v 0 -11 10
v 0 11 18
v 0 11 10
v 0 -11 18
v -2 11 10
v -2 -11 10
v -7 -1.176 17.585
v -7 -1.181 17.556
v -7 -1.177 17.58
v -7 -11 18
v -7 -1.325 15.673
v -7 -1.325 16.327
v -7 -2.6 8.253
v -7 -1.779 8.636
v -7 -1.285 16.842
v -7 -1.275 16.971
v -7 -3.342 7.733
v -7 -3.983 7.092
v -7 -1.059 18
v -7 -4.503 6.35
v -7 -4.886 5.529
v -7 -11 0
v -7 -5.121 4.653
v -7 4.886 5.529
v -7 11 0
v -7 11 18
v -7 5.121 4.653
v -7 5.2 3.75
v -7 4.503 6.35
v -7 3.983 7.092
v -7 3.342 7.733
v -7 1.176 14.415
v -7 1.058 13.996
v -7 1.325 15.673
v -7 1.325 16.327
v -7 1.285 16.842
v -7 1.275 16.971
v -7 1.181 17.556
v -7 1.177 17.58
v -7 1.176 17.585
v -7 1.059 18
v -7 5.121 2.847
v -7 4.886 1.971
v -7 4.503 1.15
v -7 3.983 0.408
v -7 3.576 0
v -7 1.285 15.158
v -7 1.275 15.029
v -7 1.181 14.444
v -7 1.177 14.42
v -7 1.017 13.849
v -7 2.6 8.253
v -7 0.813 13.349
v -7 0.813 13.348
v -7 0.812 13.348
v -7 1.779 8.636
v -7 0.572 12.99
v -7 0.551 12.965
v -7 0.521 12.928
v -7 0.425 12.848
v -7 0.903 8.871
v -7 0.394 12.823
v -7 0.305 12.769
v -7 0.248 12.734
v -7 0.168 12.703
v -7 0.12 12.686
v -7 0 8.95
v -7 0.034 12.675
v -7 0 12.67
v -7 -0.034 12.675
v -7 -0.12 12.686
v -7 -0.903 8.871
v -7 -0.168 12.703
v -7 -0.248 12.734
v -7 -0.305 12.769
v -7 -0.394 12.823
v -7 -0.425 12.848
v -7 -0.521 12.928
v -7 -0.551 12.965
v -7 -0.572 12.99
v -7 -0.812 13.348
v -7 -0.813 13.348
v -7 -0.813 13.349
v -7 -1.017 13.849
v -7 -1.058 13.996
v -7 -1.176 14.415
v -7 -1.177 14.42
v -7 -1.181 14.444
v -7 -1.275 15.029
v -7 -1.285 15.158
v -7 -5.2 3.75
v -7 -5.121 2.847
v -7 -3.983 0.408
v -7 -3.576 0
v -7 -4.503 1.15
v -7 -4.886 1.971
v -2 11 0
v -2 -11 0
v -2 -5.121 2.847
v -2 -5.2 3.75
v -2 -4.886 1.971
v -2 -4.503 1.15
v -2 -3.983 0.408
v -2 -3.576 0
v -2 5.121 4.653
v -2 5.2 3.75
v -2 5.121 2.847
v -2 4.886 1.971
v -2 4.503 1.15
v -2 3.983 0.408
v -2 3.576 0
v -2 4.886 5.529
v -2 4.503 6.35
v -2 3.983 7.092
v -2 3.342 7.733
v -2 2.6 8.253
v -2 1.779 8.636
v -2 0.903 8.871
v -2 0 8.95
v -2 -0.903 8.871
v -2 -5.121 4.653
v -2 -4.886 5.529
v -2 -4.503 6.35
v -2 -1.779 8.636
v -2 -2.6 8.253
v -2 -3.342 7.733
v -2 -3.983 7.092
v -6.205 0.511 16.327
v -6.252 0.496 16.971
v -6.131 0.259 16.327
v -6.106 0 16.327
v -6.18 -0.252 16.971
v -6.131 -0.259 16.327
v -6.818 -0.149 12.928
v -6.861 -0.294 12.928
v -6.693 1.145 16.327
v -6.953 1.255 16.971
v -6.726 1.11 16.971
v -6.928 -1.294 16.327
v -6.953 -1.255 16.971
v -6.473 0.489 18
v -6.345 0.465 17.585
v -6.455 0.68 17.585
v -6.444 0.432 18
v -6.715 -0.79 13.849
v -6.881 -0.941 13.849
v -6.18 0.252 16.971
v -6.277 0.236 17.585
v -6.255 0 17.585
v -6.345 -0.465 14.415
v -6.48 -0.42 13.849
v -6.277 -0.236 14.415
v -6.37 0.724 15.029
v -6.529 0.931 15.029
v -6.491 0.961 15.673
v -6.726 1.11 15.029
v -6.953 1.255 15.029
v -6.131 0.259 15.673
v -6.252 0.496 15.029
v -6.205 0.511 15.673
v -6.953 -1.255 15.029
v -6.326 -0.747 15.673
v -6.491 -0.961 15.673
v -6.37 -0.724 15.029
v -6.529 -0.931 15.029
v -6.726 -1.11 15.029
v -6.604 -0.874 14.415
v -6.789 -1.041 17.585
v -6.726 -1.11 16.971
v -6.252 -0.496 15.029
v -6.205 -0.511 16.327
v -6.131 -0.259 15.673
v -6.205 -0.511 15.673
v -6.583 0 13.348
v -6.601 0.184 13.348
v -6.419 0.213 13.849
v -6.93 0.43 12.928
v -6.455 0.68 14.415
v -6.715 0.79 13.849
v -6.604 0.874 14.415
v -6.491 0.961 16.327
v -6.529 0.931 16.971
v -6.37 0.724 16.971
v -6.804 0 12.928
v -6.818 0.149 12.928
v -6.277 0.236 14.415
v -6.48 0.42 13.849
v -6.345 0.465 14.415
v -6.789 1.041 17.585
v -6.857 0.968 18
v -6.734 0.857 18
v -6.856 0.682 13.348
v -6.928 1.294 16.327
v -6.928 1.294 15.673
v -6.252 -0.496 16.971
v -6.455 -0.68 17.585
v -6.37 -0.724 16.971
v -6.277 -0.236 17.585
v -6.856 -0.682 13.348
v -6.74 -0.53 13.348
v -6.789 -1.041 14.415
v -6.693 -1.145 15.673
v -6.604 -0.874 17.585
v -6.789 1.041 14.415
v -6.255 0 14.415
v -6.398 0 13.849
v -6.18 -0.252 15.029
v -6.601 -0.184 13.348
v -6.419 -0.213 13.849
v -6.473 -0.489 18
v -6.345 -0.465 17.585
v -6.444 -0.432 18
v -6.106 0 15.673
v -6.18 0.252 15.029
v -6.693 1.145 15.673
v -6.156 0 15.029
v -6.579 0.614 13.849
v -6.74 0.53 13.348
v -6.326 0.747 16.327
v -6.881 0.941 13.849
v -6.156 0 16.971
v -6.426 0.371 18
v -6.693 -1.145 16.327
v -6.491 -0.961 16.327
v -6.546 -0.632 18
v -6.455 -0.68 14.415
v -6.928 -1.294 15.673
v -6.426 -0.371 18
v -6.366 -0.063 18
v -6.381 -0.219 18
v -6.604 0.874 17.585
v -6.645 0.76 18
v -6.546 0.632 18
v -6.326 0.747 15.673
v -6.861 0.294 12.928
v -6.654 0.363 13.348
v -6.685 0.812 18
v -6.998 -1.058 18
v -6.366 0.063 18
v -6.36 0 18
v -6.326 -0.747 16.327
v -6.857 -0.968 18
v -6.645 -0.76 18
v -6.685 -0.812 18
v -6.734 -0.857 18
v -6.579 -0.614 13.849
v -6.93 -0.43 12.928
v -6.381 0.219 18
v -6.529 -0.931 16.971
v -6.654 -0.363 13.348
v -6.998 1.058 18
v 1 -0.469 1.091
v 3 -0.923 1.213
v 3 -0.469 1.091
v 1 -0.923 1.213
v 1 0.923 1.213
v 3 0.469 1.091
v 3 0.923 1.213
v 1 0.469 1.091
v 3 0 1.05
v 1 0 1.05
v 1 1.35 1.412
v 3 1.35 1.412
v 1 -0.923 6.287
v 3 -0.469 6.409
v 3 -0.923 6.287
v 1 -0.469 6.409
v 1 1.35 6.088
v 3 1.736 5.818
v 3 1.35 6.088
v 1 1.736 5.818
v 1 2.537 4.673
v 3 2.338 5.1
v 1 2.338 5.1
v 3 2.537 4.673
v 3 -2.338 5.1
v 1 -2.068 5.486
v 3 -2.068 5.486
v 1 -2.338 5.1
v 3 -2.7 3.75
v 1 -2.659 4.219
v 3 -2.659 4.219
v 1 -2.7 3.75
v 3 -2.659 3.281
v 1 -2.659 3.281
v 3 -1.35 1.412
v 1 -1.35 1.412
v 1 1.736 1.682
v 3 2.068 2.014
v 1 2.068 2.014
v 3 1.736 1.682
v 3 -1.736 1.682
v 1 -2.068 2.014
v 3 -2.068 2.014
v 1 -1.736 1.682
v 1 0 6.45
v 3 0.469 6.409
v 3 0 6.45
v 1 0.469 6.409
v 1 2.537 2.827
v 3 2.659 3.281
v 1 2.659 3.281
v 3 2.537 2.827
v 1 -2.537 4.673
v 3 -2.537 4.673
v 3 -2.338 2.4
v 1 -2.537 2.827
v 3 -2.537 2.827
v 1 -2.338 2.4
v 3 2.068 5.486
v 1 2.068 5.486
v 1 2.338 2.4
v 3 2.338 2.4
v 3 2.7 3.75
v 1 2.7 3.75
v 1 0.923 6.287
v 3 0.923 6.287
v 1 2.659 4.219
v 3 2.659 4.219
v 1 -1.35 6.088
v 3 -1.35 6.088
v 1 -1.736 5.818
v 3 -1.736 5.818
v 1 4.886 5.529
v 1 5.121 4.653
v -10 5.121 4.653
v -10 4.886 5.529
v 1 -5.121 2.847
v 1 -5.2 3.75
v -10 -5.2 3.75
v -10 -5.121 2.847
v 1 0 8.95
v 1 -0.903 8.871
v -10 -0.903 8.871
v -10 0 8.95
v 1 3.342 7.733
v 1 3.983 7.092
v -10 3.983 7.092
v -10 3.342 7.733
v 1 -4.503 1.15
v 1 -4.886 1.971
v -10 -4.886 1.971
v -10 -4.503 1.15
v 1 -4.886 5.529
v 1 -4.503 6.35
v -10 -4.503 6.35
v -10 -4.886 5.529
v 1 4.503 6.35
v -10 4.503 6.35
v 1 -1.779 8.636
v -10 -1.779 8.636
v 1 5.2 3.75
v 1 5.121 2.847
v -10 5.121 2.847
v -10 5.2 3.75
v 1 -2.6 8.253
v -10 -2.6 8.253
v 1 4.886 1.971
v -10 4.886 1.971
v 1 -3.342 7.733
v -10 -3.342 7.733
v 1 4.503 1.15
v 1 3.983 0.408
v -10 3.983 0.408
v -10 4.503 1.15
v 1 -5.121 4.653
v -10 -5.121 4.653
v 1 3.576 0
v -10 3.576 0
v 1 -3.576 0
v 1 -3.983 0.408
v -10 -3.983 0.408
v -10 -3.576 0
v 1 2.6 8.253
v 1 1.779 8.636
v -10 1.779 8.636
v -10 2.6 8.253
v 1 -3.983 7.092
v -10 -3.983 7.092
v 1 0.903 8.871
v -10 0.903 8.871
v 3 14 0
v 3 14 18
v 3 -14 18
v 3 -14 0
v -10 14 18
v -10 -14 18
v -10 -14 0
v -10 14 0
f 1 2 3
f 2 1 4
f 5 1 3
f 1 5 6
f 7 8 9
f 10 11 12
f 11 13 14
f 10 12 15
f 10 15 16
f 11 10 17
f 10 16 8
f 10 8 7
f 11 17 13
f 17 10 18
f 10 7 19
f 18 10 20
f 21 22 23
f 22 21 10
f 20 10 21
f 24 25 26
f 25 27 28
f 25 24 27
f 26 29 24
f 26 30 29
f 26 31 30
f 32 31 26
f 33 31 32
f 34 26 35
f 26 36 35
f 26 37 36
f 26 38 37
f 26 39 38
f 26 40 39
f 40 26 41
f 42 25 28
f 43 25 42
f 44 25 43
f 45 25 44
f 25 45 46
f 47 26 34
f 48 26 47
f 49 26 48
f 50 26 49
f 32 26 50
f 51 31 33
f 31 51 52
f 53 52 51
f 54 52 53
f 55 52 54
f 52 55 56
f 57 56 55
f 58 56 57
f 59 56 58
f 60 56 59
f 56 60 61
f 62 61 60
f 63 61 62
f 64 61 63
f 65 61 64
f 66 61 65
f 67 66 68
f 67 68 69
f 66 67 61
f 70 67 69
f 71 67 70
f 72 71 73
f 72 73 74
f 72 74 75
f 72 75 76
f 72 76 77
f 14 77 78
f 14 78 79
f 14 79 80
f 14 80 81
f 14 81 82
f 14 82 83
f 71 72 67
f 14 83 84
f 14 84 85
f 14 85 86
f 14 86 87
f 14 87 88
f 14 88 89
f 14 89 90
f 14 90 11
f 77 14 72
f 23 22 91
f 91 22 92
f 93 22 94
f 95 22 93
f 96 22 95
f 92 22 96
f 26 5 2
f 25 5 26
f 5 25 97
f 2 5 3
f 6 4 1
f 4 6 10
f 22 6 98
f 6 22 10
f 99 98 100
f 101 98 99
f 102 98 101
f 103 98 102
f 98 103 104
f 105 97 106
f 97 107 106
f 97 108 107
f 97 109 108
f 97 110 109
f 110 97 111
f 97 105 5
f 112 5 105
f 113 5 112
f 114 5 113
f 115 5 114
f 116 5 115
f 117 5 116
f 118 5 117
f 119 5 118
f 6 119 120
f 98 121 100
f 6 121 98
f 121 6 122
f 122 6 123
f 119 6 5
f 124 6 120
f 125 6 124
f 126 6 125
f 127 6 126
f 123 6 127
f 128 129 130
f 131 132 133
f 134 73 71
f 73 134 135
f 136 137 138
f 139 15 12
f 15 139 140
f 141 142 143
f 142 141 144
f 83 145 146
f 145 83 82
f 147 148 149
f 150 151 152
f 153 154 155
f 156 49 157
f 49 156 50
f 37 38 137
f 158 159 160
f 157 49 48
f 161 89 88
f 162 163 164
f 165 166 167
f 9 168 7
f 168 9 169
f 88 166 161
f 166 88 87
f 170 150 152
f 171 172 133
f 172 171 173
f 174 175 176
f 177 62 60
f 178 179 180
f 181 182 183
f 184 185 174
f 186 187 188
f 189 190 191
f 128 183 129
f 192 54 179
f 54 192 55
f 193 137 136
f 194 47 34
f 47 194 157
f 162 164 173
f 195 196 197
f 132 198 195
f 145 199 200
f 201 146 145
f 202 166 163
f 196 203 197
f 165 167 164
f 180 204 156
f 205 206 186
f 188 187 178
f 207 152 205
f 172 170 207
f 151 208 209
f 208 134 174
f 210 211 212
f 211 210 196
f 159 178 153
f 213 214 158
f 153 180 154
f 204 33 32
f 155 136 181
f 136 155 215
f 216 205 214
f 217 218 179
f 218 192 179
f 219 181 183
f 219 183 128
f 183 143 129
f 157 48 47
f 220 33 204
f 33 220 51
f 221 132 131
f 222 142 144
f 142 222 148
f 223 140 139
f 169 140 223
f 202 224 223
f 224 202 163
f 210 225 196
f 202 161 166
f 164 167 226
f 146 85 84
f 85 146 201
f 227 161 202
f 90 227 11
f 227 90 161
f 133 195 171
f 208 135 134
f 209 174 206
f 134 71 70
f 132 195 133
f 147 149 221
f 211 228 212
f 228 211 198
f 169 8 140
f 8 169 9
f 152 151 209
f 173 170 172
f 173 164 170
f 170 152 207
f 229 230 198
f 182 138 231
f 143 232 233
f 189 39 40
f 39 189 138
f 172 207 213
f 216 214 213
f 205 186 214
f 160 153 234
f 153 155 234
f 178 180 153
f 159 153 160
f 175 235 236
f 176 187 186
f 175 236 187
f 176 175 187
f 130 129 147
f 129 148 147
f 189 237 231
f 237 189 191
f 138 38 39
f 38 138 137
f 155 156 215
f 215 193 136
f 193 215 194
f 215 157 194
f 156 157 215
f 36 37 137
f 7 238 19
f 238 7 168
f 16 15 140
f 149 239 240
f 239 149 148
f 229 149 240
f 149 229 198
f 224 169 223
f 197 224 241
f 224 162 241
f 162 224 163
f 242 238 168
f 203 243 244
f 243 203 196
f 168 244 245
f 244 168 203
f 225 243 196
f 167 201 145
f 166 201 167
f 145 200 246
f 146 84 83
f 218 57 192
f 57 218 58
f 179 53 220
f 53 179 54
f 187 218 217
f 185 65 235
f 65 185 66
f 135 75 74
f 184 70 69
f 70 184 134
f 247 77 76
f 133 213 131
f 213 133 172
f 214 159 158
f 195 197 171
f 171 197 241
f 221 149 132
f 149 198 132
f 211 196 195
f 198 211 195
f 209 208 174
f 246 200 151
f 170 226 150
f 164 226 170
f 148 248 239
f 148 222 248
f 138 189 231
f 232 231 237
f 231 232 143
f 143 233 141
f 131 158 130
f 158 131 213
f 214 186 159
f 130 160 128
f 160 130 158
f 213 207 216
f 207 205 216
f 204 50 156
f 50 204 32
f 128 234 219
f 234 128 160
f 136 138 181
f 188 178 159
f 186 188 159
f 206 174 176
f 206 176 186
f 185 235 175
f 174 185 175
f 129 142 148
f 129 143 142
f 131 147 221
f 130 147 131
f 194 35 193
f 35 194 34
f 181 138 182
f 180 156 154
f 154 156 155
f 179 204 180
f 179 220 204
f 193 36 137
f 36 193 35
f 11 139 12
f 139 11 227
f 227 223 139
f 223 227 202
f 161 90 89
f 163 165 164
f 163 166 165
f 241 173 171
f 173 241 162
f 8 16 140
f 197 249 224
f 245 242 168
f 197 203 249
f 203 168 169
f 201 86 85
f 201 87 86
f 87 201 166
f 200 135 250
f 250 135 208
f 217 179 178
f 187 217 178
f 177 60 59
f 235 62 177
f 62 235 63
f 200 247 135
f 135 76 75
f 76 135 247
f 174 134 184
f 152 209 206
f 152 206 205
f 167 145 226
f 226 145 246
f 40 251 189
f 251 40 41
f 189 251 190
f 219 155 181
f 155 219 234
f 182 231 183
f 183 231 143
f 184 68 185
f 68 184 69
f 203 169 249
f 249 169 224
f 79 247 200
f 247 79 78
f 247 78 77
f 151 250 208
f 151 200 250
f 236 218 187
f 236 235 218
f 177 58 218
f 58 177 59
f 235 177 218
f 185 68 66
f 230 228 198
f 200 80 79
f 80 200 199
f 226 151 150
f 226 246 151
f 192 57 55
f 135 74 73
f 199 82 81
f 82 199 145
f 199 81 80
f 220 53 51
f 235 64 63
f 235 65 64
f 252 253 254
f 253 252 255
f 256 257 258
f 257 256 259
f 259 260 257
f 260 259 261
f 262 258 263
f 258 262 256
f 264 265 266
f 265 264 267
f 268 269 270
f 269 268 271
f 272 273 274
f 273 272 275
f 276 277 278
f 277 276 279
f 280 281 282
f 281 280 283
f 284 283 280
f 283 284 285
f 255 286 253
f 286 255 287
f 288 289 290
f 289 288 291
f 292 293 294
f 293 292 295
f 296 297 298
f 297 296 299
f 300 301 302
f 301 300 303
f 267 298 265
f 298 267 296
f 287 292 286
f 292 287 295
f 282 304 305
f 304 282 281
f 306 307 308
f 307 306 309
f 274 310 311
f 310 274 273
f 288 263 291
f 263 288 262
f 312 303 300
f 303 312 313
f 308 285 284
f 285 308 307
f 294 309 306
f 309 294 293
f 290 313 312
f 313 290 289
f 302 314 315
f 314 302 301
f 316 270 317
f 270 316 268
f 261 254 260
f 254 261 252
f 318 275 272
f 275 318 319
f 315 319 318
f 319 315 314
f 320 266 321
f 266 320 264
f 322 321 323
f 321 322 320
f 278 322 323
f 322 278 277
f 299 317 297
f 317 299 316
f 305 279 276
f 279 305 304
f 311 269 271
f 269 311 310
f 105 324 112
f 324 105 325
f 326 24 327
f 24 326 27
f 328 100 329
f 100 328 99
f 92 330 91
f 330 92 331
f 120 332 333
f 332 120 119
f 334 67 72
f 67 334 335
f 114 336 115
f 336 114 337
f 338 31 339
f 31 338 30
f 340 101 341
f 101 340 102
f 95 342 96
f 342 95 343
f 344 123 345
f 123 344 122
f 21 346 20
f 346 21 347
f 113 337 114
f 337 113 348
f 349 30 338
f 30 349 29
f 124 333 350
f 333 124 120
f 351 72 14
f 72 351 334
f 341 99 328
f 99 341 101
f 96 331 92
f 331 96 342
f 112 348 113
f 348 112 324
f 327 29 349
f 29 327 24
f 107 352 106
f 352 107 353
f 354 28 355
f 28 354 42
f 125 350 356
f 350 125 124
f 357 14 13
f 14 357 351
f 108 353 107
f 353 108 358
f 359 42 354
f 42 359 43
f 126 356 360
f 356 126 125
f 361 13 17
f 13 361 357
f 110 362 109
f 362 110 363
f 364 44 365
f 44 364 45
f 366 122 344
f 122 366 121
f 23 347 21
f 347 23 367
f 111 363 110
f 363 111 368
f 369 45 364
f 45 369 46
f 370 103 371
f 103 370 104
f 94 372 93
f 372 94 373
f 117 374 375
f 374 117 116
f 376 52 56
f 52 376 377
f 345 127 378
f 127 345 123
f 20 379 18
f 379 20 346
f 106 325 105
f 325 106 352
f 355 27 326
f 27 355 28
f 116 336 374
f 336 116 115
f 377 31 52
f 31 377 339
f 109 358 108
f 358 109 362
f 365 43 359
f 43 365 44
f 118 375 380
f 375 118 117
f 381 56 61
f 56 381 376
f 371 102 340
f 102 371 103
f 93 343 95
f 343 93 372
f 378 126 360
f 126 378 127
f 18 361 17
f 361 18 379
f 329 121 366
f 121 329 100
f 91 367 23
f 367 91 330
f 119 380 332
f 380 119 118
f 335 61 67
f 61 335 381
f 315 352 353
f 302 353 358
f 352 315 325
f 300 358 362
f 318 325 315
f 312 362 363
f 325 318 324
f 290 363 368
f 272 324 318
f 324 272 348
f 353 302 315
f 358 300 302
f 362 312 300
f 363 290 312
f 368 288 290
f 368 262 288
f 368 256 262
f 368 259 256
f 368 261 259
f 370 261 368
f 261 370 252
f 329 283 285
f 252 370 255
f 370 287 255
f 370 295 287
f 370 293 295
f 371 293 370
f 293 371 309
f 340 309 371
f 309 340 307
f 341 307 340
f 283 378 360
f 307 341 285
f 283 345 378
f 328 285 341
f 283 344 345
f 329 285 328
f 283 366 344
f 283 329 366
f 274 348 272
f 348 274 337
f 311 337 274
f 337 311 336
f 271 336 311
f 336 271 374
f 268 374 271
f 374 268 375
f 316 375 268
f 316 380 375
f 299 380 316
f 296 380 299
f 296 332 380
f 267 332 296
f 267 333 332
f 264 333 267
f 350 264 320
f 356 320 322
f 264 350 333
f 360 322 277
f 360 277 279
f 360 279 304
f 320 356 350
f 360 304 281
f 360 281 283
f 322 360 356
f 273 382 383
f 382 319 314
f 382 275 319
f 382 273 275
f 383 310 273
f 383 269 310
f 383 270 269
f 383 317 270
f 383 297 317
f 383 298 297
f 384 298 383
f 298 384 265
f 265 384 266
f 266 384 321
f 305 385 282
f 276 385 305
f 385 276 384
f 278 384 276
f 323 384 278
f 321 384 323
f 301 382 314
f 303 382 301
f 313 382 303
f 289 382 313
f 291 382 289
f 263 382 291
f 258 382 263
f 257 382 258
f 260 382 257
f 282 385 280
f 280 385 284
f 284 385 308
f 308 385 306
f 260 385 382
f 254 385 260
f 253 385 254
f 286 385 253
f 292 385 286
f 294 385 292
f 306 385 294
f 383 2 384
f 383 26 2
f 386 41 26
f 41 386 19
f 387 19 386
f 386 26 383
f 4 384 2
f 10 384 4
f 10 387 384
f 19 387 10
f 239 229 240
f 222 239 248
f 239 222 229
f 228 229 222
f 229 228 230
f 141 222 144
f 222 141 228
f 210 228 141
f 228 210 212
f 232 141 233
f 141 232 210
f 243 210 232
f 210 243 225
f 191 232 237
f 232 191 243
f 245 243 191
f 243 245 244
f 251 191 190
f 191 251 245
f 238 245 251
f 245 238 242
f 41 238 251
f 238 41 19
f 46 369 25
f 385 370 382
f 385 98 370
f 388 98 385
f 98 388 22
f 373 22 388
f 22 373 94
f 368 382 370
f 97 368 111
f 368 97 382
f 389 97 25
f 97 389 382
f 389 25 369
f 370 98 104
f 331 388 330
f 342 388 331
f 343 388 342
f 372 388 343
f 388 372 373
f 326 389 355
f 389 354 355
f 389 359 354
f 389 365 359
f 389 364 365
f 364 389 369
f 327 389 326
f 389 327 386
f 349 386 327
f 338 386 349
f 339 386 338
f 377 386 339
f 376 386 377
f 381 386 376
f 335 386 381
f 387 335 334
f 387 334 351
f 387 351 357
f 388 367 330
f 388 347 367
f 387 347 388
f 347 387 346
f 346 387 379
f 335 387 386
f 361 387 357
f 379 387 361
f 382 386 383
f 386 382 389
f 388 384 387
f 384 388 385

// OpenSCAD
// file: ../functions.scad
//a cylinder with a flat on top - for drawing vertical holes.
module cap_cylinder(r=1, h=1, center=false){
	render() union(){
		cylinder(r=r, h=h, center=center);
		intersection(){
			rotate([0,0,22.5]) cylinder(r=r/cos(180/8), h=h, $fn=8, center=center);
			translate([0,-r/cos(180/4),0]) rotate([0,0,0]) cylinder(r=r/cos(180/4), h=h, $fn=4, center=center);
		}
	}
}

module screw_hole_m3(cap=false, onion=0, height=wall){
    screw_hole(cap=cap, onion=onion, cap_height=m3_cap_height, rad=m3_rad, cap_rad=m3_cap_rad, height=height);
}

module screw_hole_m4(cap=false, onion=0, height=wall){
    screw_hole(cap=cap, onion=onion, cap_height=m4_cap_height, rad=m4_rad, cap_rad=m4_cap_rad, height=height);
}

module screw_hole_m5(cap=false, onion=0, height=wall){
    screw_hole(cap=cap, onion=onion, cap_height=m5_cap_height, rad=m5_rad, cap_rad=m5_cap_rad, height=height);
}

//screhole with a nice recess for the cap.
module screw_hole(cap=false, onion=0, height=wall){
    translate([0,0,cap_height-.05+onion])
        if(cap==true){
            cap_cylinder(r=rad, h=height);
        }else{
            cylinder(r=rad, h=height);
        }
	translate([0,0,cap_height-height])
        if(cap==true){
            cap_cylinder(r=cap_rad, h=height);
        }else{
            cylinder(r=cap_rad, h=height);
        }
}
// file: ../configuration.scad
mdf_wall = 6.5;
mdf_tab = 15;

wall = 5;

screw_slop = .2;
slop = .2;
laser_slop = -.1;

smooth_rod_rad = 10/2+laser_slop+.1;

//these can't change - measured values.
beam = 20;
bed_screw_sep = 309;
bed = 300;

layer_height=.2;

//this is using the gt2 idlers from robotdigg
//idler_rad = 13/2;
//idler_flange_rad = 18/2;
//idler_thick = 12;

//these use the smaller M5 flanged bearings as idlers
idler_rad = 10/2;
idler_flange_rad = 12/2;
idler_thick = 10;

//flanged bearing for the Z idler
z_bearing=22/2;
leadscrew_rad = 8/2+slop;
leadscrew_shaft_rad = 7;
leadscrew_screw_rad = 19.05/2;

pulley_rad = 13/2;
pulley_flange_rad = 18/2;

//using the mini V-wheels
wheel_rad = 11.5/2;
wheel_clearance = 18;
wheel_height = 9;
wheel_flange_rad = 16/2;

eccentric_rad = 7.3/2;
eccentric_flange_rad = 11/2;

//frame lengths - may be dependent on wall above.
frame_x = 500;  //we lose more in X because of the endcaps - it's where all the motors etc. will hide.
frame_y = 460;  //(460-300)/2-beam=60mm clearance on either side of the printer.
corner_y = frame_y-75;
frame_z = 460;  //because square is nice.
corner_z = frame_z-75;

corner_endplate = true; //this controls wether you want a full endcap, or just the corners.  Corners allows twisting in a direction that should be impossible when the rails are connected on both ends, but I wanted to retain the old option just in case.
corner_length = 200; //length of the corner side support.

foot_height = 20;       //tall foot, cuz the Z motor will be underneath.

echo("BOM: 4, reg rail, 2020", frame_x, "Frame");

//motor size and placement variables
motor_w = 42;
motor_r = 52/2;
motor_y = frame_y/2-beam-pulley_rad; //distance motors are from the center.

belt_thick = 6;
belt_width = 1.5;


//gantry - might want to make it bigger
echo("BOM: 1, v-rail, 2020", frame_y, "Gantry");

//bed lengths
bed_x = 300+beam*2;
bed_y = 300;  //the screwholes on the bed should line up with the long_bed rails.

bed_screw_offset_y = bed_y/2;
bed_screw_offset_x = 15+5;

echo("BOM: 2, reg rail, 2020", bed_x, "Bed mount");
echo("BOM: 3, reg rail, 2020", bed_y, "Bed mount");  //might want more than three - to hold insulation well.

//standard screw variables
m3_nut_rad = 6.01/2+slop;
m3_nut_height = 2.4;
m3_rad = 3/2+slop;
m3_cap_rad = 3.25;
m3_cap_height = 2;

m4_nut_rad = 7.66/2+slop;
m4_nut_height = 3.2;
m4_rad = 4/2+slop;
m4_cap_rad = 7/2+slop;
m4_cap_height = 2.5;

m5_nut_rad = 8.79/2;
m5_sq_nut_rad = (8*sqrt(2)+slop)/2;
m5_nut_rad_laser = 8.79/2-.445;
m5_nut_height = 4.7;
m5_rad = 5/2+slop;
m5_cap_rad = 10/2+slop;
m5_cap_height = 3;
m5_washer_rad = 10/2+.1;


//some enums
MALE = 1;
FEMALE = -1;

//makes all the holes have lots of segments
$fs=.5;
$fa=.1;
// main file
include <../configuration.scad>
include <../functions.scad>

$fn=36;


holder_switch();

angle = 130;
wall = 2;
slop = .2;
hole_height = 2.75;
hole_sep = 19.25;

height = 8;
length = hole_sep+wall*2;

endstop_width = 7.5;

m8_dia = 8;
m8_rad = m8_dia/2+slop;

m3_nut_rad = 6/cos(30)/2;
m3_nut_height = 3;
m3_rad = 1.8;
m3_cap_rad = 3.25;


module holder(){
	clamp_offset = 5;
	length = length+clamp_offset;
	difference(){
		hull(){
			translate([-m8_rad,0,height/2]) cube([length, m8_rad*2+wall*3, height],center=true);
			translate([length/2,0,height/2]) cylinder(r=m8_rad+wall/2, h=height, center=true);

			//screwholes
			
		}
		
		translate([length/2,0,height/2]) cylinder(r=m8_rad, h=height+1, center=true);
		
		//clamp
		translate([length/2-clamp_offset,0,height/2]) cylinder(r=m8_rad, h=height+1, center=true);
	
		translate([-clamp_offset,0,height/2]) cube([length, m8_rad*2, height+1],center=true);

		//screwholes
		for(i=[-1,1]) translate([i*hole_sep/2-m8_rad/2-wall, 0, height-hole_height]) rotate([-90,0,0]) {
			cap_cylinder(r=m3_rad, h=length, center=true);
			translate([0,0,m8_rad+wall*2/3]) cap_cylinder(r=m3_cap_rad, h=wall);
			translate([0,0,-m8_rad-wall*2]) cylinder(r=m3_nut_rad, h=wall*1.3333, $fn=6);
		}
	}
}

module holder_switch(){
    width=22;
    thick = 7;
    base = 3;
    wire_height = 10;
    wire = 5;
    
    wall=3;
    
    difference(){
        union(){
            //endstop holder
            translate([-thick/2,0,(height+wire_height)/2]) cube([thick+wall*2, width+wall*2,height+wire_height], center=true);
        }
                
        difference(){
            union(){
                //endstop
                #translate([-thick/2,0,height/2+wire_height+.1]) cube([thick, width,height+.2], center=true);
                //wire pass
                translate([-thick/2-(thick-wire)/2,0,wire_height/2-.1]) cube([wire, width,wire_height+.3], center=true);
            }
            
            //retainer bump
            translate([-thick-wall/4,0,height*3/4+wire_height]) scale([1.1,1,2.5]) sphere(r=wall/2);
        }
        
        //screwhole
        translate([0,0,wire_height/2-1.25]) rotate([0,90,0]) {
            cylinder(r=m5_rad, h=30, center=true);
            translate([0,0,-15+1]) cylinder(r=m5_cap_rad, h=30, center=true);
        }
        
        //flatten bottom
        for(i=[-1]) translate([0,0,25*i+height/2+height/2*i]) cube([50,50,50], center=true);
    }
}

module holder_old(){
	difference(){
		union(){
			#translate([0,0,height/2]) rotate([0,90,0]) round_clip(rad = m8_rad, height = height, wall = wall, angle=angle, support = 0, clamp=1, solid = 1);
			translate([wall/2,0,height/2]) cube([wall,hole_sep+m3_rad*2+wall*2.5,height],center=true);

			for(i=[-1,1]) translate([wall/2,hole_sep/2*i,hole_height]) rotate([0,90,0]) rotate([0,0,0]) cylinder(r1=wall+m3_nut_rad, r2=wall/2+m3_nut_rad, h=m3_nut_height+.1, $fn=6);
		}

		for(i=[-1,1]) translate([wall,hole_sep/2*i,hole_height]) rotate([0,90,0]) {
			cylinder(r=m3_nut_rad, h=m3_nut_height+.5, $fn=6);
			rotate([0,0,-90]) cap_cylinder(r=m3_rad, h=height*2, center=true);
		}

		translate([0,0,height/2]) rotate([0,90,0]) round_clip(rad = m8_rad, height = height, wall = wall, angle=angle, support = 0, clamp=1, solid = 0);

		//clean top and bot
		for(i=[-1,1]) translate([0,0,25*i+height/2+height/2*i]) cube([50,50,50], center=true);
	}
}

module round_clip(rad=8, height=10, wall=3, angle=45, support=0, clamp=0, solid=0){
	translate([0,0,wall+rad])
	rotate([0,90,0])
	if(solid == 1){
		union(){
			translate([0,0,height/2]) rotate([0,0,30]) cylinder(r=(wall/2+rad)/cos(30), h=height*2, center=true);

			if(clamp==1){
				for(i=[-1,1]) rotate([0,0,i*angle/2]) translate([-rad-wall/2,0,0]) rotate([0,0,-i*angle/2]) rotate([i*90,0,0]) hull(){
					translate([wall/2, 0, 0]) cylinder(r1=wall+m3_nut_rad, r2=wall/2+m3_nut_rad, h=m3_nut_height+.1, $fn=6, center=true);
					translate([-m8_rad, 0, 0]) cylinder(r1=wall+m3_nut_rad, r2=wall/2+m3_nut_rad, h=m3_nut_height+.1, $fn=6, center=true);
				}
			}
		}
	}else{
		//hollow
		cylinder(r=rad, h=height*4, center=true);
		hull(){
			if(support==1){
				translate([0,0,rad+wall+height/2]) rotate([90,0,0]) cylinder(r=rad+wall, h=height*3, center=true);
			}else{
				translate([rad*2,0,rad+wall+height/2]) rotate([90,0,0]) cylinder(r=rad+wall, h=height*3, center=true);
			}
			translate([-rad,0,rad+wall+height/2]) rotate([90,0,0]) cylinder(r=rad+wall, h=height*3, center=true);
		}

		//zip tie slot
		*translate([-1,0,0]) difference(){
			cylinder(r=(wall/2+rad+2)/cos(30), h=3, center=true);
			cylinder(r=(wall/2+rad)/cos(30), h=4, center=true);
		}
		
		//clip cutout
		difference(){
			for(i=[-1,0,1]) rotate([0,0,i*(angle/2-30)]) translate([-rad*2,0,0]) cylinder(r=rad*2, h=height*3, center=true, $fn=3);
			for(i=[-1,1]) rotate([0,0,i*angle/2]) translate([-rad-wall/2,0,0]) cylinder(r=wall/2, h=height*3, center=true);
			if(clamp == 1){
				for(i=[-1,1]) rotate([0,0,i*angle/2]) translate([-rad-wall/2,0,0]) rotate([0,0,-i*angle/2]) rotate([i*90,0,0]) hull(){
					cylinder(r1=wall+m3_nut_rad, r2=wall/2+m3_nut_rad, h=m3_nut_height+.1, $fn=6, center=true);
					translate([-m8_rad, 0, 0]) cylinder(r1=wall+m3_nut_rad, r2=wall/2+m3_nut_rad, h=m3_nut_height+.1, $fn=6, center=true);
				}
			}
		}

		if(clamp == 1){
			rotate([0,0,1*angle/2]) translate([-rad-wall/2,0,0]) rotate([0,0,-1*angle/2]) rotate([0,0,0]) rotate([90,0,0]) translate([-m8_rad, 0, -m8_rad*4]) cylinder(r=m3_rad, h=m8_rad*6);
			rotate([0,0,1*angle/2]) translate([-rad-wall/2,0,0]) rotate([0,0,-1*angle/2]) rotate([0,0,0]) rotate([90,0,0]) translate([-m8_rad, 0, 0]) cylinder(r=m3_cap_rad, h=wall);
			rotate([0,0,-1*angle/2]) translate([-rad-wall/2,0,0]) rotate([0,0,1*angle/2]) rotate([0,0,0]) rotate([90,0,0]) translate([-m8_rad, 0, -wall]) cylinder(r=m3_nut_rad, h=wall, $fn=6);
		}
	}
}


module tear(r, h) {
  union() {
    cylinder(r=r, h=h);
    rotate([0, 0, 135]) cube([r, r, h]);
  }
}

module crap(){
difference() {
  union() {
		translate([1,.5,0])
		cube([15, 11.2, 7]);

		translate([-13, 17, 0])
		cube([28, 2.5, 7]);

		translate([8.4, 11.2, 0])
		cylinder(r=16 / 2, h=7);
  }

	translate([-0.1, 4.9, 3.3])
	rotate([0, 90, 0])
	tear(r=3.1 / 2, h=23);

	translate([8.4, 11.2, -1])
	cylinder(r=4.2, h=10);

	translate([4.7, -1, -1])
	cube([7.2, 11.2, 10]);

		translate([-9.25, 21, 4.5])
		rotate([90, 0, 0])
		cylinder(r=1.8, h=9);

		translate([-9.25, 18, 4.5])
		rotate([90, 0, 0])
		rotate([0,0,30]) cylinder(r=3/cos(30), h=3, $fn=6);	

		translate([10, 18, 4.5])
		rotate([90, 0, 0])
		rotate([0,0,30]) cylinder(r=3.2, h=3, $fn=6);
		translate([10, 18, 6])
		rotate([90, 0, 0])
		rotate([0,0,30]) cylinder(r=3.2, h=3, $fn=6);
		
		translate([10,19.6, 4.5])
		rotate([90, 0, 0])
		cylinder(r=1.8, h=9);

  translate([3.9, -5, -1])
  cylinder(r=1.5, h=6);
}
}

module cap_cylinder(r=1, h=1, center=false){
	render() union(){
		cylinder(r=r, h=h, center=center);
		intersection(){
			rotate([0,0,22.5]) cylinder(r=r/cos(180/8), h=h, $fn=8, center=center);
			translate([0,-r/cos(180/4),0]) rotate([0,0,0]) cylinder(r=r/cos(180/4), h=h, $fn=4, center=center);
		}
	}
}
